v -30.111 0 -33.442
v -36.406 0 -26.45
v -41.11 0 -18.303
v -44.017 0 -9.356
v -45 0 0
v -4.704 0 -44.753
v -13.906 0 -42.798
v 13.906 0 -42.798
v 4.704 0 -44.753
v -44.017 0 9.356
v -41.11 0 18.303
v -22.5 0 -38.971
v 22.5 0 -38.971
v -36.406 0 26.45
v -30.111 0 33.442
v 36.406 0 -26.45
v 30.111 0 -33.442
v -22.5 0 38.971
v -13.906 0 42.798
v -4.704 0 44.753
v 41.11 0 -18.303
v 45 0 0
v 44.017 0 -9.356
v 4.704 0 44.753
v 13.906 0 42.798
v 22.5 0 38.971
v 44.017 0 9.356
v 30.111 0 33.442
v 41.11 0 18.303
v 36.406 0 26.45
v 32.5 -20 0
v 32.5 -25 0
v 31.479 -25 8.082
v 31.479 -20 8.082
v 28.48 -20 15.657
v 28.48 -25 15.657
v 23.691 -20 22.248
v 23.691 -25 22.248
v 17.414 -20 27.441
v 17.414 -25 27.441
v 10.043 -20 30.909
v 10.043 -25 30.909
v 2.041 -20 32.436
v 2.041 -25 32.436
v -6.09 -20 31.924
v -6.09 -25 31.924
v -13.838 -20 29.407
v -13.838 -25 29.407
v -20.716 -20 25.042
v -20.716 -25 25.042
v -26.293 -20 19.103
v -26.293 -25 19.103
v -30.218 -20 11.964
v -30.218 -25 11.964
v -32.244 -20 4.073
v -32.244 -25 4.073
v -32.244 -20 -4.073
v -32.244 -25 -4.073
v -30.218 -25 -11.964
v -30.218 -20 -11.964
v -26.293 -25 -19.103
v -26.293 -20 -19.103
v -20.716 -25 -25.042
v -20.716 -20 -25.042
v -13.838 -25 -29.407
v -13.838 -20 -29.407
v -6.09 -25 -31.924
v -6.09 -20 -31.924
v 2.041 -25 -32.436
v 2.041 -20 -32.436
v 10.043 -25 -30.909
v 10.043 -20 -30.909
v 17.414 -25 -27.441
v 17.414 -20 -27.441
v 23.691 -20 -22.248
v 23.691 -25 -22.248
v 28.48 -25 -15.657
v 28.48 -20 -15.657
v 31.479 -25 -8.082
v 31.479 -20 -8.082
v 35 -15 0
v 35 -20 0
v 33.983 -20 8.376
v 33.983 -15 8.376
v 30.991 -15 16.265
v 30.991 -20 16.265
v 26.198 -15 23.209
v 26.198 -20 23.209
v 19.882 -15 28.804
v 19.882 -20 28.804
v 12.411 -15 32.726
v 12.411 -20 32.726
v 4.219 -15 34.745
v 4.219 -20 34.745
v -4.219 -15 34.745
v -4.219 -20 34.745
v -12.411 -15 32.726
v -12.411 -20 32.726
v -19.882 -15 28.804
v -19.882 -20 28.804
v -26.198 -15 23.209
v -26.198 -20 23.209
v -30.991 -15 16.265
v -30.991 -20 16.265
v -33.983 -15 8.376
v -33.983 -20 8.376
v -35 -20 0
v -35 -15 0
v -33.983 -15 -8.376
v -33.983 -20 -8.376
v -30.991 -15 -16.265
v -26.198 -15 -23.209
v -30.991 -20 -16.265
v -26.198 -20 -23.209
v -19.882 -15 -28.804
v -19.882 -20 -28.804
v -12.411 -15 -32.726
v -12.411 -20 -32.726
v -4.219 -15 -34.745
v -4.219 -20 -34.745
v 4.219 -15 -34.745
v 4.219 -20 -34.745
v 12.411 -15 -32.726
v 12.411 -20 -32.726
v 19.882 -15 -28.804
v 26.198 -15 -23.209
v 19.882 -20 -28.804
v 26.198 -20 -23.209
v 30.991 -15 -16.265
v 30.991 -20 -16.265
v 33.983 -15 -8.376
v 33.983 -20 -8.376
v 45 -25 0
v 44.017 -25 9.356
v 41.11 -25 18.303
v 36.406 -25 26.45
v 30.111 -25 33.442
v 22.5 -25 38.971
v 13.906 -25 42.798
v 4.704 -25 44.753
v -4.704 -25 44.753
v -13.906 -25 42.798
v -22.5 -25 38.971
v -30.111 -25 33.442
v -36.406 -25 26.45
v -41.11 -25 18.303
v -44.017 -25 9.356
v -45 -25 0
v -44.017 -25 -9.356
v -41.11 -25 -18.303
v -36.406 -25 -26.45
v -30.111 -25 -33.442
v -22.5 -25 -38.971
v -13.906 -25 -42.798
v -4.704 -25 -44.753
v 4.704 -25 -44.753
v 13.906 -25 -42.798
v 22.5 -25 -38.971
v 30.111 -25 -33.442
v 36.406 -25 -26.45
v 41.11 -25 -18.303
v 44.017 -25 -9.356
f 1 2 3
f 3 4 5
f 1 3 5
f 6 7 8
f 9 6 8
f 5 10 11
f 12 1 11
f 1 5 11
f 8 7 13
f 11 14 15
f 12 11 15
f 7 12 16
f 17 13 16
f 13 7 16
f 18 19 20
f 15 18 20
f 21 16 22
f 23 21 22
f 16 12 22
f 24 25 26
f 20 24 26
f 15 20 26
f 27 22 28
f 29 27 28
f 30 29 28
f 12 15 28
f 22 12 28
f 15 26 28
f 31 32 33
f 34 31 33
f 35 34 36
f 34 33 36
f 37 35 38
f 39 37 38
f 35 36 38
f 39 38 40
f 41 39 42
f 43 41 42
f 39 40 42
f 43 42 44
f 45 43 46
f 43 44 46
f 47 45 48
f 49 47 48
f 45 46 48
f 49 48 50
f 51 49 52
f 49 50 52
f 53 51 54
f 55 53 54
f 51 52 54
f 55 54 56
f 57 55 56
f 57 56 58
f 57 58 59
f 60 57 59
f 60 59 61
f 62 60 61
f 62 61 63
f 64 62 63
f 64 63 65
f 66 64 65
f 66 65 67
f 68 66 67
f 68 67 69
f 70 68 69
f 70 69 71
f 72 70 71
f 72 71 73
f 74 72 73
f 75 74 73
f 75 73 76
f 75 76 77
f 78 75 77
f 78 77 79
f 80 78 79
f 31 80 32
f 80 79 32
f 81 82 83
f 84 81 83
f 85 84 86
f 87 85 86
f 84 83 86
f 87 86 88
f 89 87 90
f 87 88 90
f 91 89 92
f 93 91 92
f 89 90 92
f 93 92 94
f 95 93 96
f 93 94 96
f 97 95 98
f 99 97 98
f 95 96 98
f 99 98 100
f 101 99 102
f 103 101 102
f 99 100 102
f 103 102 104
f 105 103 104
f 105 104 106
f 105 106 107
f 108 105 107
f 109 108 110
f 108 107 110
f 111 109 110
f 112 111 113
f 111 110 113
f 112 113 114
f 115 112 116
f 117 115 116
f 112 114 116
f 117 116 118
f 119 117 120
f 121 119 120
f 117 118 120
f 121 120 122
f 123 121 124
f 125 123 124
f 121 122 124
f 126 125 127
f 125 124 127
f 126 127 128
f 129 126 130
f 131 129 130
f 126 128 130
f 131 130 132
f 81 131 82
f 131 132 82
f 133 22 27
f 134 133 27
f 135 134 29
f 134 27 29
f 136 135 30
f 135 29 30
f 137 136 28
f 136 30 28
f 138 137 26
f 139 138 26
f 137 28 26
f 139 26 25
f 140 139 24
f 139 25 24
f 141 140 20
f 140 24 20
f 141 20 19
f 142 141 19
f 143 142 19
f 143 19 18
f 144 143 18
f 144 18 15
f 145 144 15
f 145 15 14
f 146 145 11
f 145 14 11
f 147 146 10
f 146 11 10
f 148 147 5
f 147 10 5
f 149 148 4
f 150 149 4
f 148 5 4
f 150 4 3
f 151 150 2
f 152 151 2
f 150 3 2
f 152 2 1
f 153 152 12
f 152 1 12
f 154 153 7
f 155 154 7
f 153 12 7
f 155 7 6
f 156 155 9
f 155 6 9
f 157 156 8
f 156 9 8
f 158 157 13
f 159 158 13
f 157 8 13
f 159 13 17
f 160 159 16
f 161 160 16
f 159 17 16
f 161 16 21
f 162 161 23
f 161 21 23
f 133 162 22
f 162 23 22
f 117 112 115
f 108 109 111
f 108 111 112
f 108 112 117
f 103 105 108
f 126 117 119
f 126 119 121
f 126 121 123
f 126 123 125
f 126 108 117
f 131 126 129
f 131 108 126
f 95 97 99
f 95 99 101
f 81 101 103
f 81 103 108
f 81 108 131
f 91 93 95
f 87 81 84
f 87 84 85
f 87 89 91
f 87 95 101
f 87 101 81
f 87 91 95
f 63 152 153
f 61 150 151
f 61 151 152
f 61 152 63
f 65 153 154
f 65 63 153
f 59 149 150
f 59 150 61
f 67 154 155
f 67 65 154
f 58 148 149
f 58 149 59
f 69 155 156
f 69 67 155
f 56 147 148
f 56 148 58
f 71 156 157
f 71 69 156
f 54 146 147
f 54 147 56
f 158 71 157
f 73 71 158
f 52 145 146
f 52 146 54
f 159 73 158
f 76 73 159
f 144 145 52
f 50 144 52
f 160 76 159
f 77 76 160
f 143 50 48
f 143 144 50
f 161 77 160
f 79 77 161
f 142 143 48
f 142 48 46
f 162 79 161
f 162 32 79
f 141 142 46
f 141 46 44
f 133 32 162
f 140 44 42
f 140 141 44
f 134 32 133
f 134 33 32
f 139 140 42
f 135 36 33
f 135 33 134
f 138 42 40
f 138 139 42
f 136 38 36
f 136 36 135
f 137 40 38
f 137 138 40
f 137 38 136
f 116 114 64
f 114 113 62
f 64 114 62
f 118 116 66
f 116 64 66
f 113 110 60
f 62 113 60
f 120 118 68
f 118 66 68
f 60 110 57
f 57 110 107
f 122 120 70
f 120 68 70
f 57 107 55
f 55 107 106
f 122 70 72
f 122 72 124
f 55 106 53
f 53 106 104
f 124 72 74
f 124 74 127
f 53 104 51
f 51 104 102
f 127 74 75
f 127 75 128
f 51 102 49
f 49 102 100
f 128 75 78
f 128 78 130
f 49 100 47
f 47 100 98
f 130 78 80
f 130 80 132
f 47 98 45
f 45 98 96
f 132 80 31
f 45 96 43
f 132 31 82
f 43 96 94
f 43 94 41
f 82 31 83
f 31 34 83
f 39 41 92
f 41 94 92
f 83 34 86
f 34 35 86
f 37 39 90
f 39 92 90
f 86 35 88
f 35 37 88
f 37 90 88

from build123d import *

# Parameters (mm, degrees)
F0_R     = 45
F1_DEPTH = 25
F2_R     = 32.5
F3_DEPTH = 10
F5_R     = 35
F5_R_2   = 32.5
F6_DEPTH = 5


with BuildPart() as f1:
    # F0 (on Front) → F1 (new body)
    with BuildSketch(Plane.XZ):
        Circle(F0_R)
    extrude(amount=F1_DEPTH)

    # F2 (on face) → F3 (cut)
    with BuildSketch(Plane.XZ.offset(25)):
        Circle(F2_R)
    extrude(amount=-F3_DEPTH, mode=Mode.SUBTRACT)

    # F5 (on offset) → F6 (cut)
    with BuildSketch(Plane.XZ.offset(20)):
        Circle(F5_R)
        Circle(F5_R_2, mode=Mode.SUBTRACT)
    extrude(amount=-F6_DEPTH, mode=Mode.SUBTRACT)


solid = f1.part
